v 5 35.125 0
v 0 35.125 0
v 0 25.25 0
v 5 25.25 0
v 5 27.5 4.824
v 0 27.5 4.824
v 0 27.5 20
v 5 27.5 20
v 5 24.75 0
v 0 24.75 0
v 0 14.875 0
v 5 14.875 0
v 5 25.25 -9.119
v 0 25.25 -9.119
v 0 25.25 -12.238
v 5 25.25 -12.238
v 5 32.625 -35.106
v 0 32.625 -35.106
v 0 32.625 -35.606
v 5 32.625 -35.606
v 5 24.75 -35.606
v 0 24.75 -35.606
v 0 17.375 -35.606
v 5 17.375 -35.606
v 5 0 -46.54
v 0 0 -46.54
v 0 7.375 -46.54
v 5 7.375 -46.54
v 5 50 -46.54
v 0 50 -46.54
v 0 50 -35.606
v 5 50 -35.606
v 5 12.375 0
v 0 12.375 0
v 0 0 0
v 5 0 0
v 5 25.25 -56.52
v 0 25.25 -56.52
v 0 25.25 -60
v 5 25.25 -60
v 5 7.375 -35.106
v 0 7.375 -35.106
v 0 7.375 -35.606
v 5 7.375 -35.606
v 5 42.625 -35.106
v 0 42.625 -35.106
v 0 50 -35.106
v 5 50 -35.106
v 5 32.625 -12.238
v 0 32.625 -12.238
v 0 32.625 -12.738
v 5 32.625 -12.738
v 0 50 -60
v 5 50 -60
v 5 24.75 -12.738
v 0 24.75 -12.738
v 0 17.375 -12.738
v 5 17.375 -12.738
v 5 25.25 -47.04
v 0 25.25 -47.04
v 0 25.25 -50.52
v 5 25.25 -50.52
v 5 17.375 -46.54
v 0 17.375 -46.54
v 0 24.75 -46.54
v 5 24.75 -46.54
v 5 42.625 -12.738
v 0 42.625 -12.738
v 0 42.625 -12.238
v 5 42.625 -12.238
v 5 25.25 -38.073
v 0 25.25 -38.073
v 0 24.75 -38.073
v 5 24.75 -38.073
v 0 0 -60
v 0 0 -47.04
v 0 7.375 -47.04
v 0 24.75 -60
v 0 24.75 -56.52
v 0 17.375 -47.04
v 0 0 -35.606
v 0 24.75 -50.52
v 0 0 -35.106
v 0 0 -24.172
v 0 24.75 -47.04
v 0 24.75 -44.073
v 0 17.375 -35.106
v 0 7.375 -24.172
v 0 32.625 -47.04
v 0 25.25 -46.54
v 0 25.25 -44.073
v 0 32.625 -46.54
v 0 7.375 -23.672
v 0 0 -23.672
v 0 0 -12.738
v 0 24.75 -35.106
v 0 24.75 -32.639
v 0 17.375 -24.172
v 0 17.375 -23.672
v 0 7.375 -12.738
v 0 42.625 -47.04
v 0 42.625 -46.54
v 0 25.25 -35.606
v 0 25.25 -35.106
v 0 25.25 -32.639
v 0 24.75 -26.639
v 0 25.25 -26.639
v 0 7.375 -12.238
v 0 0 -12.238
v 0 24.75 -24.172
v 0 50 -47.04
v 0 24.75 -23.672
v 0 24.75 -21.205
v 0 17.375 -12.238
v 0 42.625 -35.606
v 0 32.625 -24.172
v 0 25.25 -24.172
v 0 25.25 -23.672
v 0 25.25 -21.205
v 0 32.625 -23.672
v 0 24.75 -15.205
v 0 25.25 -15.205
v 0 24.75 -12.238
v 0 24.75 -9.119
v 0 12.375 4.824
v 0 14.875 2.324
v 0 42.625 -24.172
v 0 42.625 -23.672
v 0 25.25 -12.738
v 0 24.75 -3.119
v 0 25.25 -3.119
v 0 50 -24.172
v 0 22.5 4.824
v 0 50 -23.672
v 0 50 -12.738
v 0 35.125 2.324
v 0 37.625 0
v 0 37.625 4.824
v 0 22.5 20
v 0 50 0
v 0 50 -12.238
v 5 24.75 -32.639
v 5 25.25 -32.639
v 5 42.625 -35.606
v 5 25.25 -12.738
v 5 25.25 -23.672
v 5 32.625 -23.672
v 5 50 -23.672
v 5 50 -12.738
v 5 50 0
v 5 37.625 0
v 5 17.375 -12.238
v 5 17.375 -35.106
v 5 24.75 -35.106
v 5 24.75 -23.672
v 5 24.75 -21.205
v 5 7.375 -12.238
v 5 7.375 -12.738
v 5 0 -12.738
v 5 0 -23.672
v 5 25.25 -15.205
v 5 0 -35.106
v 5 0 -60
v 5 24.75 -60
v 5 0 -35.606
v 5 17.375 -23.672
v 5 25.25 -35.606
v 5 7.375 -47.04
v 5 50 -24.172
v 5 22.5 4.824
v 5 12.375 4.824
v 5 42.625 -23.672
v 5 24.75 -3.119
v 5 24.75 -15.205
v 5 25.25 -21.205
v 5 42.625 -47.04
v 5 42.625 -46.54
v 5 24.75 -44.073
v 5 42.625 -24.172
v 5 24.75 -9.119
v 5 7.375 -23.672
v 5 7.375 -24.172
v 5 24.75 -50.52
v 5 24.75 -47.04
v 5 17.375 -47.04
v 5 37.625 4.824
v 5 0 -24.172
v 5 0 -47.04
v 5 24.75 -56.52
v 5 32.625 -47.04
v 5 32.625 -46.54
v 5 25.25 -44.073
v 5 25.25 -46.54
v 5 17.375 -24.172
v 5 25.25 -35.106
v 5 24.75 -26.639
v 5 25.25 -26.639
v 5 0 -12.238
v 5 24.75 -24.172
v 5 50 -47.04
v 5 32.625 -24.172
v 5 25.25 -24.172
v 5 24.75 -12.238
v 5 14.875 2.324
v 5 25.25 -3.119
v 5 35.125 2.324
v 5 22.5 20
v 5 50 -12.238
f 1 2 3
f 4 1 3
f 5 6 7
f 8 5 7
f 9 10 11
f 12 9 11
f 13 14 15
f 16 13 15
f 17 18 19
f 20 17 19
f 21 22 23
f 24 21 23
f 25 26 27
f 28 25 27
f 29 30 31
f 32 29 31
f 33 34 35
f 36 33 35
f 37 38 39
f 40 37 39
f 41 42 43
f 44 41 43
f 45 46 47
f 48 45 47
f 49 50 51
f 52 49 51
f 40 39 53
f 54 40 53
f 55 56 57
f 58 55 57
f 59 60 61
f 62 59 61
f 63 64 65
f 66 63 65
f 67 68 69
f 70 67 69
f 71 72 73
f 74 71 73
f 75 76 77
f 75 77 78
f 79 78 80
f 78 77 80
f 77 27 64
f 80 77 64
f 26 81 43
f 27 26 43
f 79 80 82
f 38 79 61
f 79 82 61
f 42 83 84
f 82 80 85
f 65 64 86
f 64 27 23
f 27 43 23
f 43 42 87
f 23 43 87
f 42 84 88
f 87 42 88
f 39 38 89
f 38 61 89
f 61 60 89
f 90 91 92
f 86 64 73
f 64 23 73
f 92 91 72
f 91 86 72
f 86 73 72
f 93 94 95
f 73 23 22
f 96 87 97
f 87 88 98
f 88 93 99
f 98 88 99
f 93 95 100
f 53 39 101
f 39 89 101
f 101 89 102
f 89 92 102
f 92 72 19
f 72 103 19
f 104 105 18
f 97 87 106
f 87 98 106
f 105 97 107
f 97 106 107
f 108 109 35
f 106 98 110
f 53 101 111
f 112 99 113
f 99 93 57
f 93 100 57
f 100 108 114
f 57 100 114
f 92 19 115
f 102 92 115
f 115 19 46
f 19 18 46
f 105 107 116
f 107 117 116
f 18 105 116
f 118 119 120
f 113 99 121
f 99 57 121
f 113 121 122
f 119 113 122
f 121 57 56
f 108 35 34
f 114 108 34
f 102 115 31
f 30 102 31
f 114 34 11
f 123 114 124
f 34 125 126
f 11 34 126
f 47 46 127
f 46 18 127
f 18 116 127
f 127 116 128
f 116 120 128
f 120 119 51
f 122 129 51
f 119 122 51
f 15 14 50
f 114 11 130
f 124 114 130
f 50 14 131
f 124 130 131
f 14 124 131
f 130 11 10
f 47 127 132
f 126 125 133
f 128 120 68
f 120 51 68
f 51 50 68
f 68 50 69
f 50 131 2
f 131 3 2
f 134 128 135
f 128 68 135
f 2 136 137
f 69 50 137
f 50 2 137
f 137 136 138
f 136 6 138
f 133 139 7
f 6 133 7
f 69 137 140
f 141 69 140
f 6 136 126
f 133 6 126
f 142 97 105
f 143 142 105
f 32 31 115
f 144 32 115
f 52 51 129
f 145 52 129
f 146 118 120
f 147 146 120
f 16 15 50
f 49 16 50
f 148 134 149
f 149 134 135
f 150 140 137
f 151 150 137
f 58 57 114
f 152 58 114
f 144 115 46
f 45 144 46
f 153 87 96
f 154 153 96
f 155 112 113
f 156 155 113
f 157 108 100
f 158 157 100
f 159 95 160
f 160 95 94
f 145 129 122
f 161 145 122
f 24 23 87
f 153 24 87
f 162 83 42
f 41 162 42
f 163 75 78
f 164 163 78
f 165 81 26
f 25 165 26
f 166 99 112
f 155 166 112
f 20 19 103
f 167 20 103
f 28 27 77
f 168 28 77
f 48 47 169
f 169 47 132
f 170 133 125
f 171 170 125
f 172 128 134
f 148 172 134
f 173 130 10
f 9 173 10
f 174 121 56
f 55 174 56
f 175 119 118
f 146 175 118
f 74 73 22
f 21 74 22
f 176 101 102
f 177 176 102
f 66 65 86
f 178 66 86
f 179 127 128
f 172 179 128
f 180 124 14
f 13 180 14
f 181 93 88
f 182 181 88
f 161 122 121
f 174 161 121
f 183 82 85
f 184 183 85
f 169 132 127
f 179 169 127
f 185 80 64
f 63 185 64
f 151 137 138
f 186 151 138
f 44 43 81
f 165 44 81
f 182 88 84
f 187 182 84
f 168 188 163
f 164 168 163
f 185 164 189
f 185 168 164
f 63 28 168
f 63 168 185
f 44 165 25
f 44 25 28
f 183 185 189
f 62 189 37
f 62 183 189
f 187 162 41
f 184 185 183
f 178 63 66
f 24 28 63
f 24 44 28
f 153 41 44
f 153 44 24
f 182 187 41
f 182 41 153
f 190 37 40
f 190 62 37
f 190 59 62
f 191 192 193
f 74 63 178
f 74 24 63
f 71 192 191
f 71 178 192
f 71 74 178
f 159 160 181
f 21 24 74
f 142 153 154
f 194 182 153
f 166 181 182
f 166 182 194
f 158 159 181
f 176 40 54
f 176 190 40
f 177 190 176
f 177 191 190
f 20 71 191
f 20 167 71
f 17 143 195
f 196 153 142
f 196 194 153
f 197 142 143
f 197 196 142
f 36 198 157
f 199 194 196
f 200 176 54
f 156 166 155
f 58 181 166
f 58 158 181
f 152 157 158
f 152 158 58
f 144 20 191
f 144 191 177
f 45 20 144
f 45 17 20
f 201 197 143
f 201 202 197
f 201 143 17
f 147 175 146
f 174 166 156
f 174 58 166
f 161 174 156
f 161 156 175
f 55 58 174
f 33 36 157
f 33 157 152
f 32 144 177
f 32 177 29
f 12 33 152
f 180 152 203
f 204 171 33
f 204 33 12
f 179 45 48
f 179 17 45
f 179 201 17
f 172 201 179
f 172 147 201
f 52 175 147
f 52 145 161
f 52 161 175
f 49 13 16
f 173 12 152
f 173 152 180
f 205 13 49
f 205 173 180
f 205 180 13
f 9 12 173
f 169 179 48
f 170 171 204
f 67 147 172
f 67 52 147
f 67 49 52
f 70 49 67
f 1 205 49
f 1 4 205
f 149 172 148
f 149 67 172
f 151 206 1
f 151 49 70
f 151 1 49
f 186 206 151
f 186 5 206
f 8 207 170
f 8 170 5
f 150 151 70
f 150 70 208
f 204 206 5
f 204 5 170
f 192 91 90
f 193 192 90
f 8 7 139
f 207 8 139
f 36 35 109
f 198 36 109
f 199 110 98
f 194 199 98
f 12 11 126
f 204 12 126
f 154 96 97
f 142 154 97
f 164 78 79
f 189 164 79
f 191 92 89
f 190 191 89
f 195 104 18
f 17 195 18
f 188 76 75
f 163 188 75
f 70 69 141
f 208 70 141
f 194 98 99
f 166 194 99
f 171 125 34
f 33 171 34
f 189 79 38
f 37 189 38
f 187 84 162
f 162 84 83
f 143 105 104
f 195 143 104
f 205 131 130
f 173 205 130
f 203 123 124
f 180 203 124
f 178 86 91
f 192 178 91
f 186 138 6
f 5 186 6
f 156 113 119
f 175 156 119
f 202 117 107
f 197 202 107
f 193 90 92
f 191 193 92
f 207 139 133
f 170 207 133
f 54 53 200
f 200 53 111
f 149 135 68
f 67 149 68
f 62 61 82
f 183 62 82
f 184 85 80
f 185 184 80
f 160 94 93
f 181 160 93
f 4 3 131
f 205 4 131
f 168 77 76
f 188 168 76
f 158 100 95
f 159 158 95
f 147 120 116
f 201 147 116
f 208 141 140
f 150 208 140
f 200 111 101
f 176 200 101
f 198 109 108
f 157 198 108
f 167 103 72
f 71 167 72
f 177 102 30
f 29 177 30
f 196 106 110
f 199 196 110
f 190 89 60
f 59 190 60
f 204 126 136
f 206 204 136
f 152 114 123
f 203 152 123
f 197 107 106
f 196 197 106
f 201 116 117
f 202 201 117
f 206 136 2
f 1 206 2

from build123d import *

# Parameters (mm, degrees)
F1_DEPTH = 5


# Not quite as in the source:
# - a feature names something its author has since deleted; it is built from what else it names


with BuildPart() as f1:
    # F0 (on Right) → F1 (new body)
    with BuildSketch(Plane.YZ):
        Polygon((12.375, 0), (0, 0), (0, -12.238), (7.3750000447, -12.238), (7.3750000447, -12.738), (0, -12.738), (0, -23.672), (7.3750000447, -23.672), (7.3750000447, -24.172), (0, -24.172), (0, -35.106), (7.3750000447, -35.106), (7.3750000447, -35.606), (0, -35.606), (0, -46.54), (7.3750000447, -46.54), (7.3750000447, -47.04), (0, -47.04), (0, -60), (24.75, -60), (24.75, -56.52), (25.25, -56.52), (25.25, -60), (50, -60), (50, -47.04), (42.6249988377, -47.04), (42.6249988377, -46.54), (50, -46.54), (50, -35.606), (42.6249988377, -35.606), (42.6249988377, -35.106), (50, -35.106), (50, -24.172), (42.6249988377, -24.172), (42.6249988377, -23.672), (50, -23.672), (50, -12.738), (42.6249988377, -12.738), (42.6249988377, -12.238), (50, -12.238), (50, 0), (37.625, 0), (37.625, 4.8238829523), (27.5, 4.8238829523), (27.5, 9.8238829523), (27.5, 20), (22.5, 20), (22.5, 9.8238829523), (22.5, 4.8238829523), (12.375, 4.8238829523), align=None)
        Polygon((25.25, -44.073), (25.25, -46.54), (32.625, -46.54), (32.625, -47.04), (25.25, -47.04), (25.25, -50.52), (24.75, -50.52), (24.75, -47.04), (17.375, -47.04), (17.375, -46.54), (24.75, -46.54), (24.75, -44.073), align=None, mode=Mode.SUBTRACT)
        Polygon((25.25, -32.639), (25.25, -35.106), (32.625, -35.106), (32.625, -35.606), (25.25, -35.606), (25.25, -38.073), (24.75, -38.073), (24.75, -35.606), (17.375, -35.606), (17.375, -35.106), (24.75, -35.106), (24.75, -32.639), align=None, mode=Mode.SUBTRACT)
        Polygon((25.25, -21.205), (25.25, -23.672), (32.625, -23.672), (32.625, -24.172), (25.25, -24.172), (25.25, -26.639), (24.75, -26.639), (24.75, -24.172), (17.375, -24.172), (17.375, -23.672), (24.75, -23.672), (24.75, -21.205), align=None, mode=Mode.SUBTRACT)
        Polygon((25.25, -9.119), (25.25, -12.238), (32.625, -12.238), (32.625, -12.738), (25.25, -12.738), (25.25, -15.205), (24.75, -15.205), (24.75, -12.738), (17.375, -12.738), (17.375, -12.238), (24.75, -12.238), (24.75, -9.119), align=None, mode=Mode.SUBTRACT)
        Polygon((25.25, -1.304), (25.25, -3.119), (24.75, -3.119), (24.75, 0), (14.875, 0), (14.875, 2.3238829523), (35.125, 2.3238829523), (35.125, 0), (25.25, 0), align=None, mode=Mode.SUBTRACT)
    extrude(amount=F1_DEPTH)


solid = f1.part
